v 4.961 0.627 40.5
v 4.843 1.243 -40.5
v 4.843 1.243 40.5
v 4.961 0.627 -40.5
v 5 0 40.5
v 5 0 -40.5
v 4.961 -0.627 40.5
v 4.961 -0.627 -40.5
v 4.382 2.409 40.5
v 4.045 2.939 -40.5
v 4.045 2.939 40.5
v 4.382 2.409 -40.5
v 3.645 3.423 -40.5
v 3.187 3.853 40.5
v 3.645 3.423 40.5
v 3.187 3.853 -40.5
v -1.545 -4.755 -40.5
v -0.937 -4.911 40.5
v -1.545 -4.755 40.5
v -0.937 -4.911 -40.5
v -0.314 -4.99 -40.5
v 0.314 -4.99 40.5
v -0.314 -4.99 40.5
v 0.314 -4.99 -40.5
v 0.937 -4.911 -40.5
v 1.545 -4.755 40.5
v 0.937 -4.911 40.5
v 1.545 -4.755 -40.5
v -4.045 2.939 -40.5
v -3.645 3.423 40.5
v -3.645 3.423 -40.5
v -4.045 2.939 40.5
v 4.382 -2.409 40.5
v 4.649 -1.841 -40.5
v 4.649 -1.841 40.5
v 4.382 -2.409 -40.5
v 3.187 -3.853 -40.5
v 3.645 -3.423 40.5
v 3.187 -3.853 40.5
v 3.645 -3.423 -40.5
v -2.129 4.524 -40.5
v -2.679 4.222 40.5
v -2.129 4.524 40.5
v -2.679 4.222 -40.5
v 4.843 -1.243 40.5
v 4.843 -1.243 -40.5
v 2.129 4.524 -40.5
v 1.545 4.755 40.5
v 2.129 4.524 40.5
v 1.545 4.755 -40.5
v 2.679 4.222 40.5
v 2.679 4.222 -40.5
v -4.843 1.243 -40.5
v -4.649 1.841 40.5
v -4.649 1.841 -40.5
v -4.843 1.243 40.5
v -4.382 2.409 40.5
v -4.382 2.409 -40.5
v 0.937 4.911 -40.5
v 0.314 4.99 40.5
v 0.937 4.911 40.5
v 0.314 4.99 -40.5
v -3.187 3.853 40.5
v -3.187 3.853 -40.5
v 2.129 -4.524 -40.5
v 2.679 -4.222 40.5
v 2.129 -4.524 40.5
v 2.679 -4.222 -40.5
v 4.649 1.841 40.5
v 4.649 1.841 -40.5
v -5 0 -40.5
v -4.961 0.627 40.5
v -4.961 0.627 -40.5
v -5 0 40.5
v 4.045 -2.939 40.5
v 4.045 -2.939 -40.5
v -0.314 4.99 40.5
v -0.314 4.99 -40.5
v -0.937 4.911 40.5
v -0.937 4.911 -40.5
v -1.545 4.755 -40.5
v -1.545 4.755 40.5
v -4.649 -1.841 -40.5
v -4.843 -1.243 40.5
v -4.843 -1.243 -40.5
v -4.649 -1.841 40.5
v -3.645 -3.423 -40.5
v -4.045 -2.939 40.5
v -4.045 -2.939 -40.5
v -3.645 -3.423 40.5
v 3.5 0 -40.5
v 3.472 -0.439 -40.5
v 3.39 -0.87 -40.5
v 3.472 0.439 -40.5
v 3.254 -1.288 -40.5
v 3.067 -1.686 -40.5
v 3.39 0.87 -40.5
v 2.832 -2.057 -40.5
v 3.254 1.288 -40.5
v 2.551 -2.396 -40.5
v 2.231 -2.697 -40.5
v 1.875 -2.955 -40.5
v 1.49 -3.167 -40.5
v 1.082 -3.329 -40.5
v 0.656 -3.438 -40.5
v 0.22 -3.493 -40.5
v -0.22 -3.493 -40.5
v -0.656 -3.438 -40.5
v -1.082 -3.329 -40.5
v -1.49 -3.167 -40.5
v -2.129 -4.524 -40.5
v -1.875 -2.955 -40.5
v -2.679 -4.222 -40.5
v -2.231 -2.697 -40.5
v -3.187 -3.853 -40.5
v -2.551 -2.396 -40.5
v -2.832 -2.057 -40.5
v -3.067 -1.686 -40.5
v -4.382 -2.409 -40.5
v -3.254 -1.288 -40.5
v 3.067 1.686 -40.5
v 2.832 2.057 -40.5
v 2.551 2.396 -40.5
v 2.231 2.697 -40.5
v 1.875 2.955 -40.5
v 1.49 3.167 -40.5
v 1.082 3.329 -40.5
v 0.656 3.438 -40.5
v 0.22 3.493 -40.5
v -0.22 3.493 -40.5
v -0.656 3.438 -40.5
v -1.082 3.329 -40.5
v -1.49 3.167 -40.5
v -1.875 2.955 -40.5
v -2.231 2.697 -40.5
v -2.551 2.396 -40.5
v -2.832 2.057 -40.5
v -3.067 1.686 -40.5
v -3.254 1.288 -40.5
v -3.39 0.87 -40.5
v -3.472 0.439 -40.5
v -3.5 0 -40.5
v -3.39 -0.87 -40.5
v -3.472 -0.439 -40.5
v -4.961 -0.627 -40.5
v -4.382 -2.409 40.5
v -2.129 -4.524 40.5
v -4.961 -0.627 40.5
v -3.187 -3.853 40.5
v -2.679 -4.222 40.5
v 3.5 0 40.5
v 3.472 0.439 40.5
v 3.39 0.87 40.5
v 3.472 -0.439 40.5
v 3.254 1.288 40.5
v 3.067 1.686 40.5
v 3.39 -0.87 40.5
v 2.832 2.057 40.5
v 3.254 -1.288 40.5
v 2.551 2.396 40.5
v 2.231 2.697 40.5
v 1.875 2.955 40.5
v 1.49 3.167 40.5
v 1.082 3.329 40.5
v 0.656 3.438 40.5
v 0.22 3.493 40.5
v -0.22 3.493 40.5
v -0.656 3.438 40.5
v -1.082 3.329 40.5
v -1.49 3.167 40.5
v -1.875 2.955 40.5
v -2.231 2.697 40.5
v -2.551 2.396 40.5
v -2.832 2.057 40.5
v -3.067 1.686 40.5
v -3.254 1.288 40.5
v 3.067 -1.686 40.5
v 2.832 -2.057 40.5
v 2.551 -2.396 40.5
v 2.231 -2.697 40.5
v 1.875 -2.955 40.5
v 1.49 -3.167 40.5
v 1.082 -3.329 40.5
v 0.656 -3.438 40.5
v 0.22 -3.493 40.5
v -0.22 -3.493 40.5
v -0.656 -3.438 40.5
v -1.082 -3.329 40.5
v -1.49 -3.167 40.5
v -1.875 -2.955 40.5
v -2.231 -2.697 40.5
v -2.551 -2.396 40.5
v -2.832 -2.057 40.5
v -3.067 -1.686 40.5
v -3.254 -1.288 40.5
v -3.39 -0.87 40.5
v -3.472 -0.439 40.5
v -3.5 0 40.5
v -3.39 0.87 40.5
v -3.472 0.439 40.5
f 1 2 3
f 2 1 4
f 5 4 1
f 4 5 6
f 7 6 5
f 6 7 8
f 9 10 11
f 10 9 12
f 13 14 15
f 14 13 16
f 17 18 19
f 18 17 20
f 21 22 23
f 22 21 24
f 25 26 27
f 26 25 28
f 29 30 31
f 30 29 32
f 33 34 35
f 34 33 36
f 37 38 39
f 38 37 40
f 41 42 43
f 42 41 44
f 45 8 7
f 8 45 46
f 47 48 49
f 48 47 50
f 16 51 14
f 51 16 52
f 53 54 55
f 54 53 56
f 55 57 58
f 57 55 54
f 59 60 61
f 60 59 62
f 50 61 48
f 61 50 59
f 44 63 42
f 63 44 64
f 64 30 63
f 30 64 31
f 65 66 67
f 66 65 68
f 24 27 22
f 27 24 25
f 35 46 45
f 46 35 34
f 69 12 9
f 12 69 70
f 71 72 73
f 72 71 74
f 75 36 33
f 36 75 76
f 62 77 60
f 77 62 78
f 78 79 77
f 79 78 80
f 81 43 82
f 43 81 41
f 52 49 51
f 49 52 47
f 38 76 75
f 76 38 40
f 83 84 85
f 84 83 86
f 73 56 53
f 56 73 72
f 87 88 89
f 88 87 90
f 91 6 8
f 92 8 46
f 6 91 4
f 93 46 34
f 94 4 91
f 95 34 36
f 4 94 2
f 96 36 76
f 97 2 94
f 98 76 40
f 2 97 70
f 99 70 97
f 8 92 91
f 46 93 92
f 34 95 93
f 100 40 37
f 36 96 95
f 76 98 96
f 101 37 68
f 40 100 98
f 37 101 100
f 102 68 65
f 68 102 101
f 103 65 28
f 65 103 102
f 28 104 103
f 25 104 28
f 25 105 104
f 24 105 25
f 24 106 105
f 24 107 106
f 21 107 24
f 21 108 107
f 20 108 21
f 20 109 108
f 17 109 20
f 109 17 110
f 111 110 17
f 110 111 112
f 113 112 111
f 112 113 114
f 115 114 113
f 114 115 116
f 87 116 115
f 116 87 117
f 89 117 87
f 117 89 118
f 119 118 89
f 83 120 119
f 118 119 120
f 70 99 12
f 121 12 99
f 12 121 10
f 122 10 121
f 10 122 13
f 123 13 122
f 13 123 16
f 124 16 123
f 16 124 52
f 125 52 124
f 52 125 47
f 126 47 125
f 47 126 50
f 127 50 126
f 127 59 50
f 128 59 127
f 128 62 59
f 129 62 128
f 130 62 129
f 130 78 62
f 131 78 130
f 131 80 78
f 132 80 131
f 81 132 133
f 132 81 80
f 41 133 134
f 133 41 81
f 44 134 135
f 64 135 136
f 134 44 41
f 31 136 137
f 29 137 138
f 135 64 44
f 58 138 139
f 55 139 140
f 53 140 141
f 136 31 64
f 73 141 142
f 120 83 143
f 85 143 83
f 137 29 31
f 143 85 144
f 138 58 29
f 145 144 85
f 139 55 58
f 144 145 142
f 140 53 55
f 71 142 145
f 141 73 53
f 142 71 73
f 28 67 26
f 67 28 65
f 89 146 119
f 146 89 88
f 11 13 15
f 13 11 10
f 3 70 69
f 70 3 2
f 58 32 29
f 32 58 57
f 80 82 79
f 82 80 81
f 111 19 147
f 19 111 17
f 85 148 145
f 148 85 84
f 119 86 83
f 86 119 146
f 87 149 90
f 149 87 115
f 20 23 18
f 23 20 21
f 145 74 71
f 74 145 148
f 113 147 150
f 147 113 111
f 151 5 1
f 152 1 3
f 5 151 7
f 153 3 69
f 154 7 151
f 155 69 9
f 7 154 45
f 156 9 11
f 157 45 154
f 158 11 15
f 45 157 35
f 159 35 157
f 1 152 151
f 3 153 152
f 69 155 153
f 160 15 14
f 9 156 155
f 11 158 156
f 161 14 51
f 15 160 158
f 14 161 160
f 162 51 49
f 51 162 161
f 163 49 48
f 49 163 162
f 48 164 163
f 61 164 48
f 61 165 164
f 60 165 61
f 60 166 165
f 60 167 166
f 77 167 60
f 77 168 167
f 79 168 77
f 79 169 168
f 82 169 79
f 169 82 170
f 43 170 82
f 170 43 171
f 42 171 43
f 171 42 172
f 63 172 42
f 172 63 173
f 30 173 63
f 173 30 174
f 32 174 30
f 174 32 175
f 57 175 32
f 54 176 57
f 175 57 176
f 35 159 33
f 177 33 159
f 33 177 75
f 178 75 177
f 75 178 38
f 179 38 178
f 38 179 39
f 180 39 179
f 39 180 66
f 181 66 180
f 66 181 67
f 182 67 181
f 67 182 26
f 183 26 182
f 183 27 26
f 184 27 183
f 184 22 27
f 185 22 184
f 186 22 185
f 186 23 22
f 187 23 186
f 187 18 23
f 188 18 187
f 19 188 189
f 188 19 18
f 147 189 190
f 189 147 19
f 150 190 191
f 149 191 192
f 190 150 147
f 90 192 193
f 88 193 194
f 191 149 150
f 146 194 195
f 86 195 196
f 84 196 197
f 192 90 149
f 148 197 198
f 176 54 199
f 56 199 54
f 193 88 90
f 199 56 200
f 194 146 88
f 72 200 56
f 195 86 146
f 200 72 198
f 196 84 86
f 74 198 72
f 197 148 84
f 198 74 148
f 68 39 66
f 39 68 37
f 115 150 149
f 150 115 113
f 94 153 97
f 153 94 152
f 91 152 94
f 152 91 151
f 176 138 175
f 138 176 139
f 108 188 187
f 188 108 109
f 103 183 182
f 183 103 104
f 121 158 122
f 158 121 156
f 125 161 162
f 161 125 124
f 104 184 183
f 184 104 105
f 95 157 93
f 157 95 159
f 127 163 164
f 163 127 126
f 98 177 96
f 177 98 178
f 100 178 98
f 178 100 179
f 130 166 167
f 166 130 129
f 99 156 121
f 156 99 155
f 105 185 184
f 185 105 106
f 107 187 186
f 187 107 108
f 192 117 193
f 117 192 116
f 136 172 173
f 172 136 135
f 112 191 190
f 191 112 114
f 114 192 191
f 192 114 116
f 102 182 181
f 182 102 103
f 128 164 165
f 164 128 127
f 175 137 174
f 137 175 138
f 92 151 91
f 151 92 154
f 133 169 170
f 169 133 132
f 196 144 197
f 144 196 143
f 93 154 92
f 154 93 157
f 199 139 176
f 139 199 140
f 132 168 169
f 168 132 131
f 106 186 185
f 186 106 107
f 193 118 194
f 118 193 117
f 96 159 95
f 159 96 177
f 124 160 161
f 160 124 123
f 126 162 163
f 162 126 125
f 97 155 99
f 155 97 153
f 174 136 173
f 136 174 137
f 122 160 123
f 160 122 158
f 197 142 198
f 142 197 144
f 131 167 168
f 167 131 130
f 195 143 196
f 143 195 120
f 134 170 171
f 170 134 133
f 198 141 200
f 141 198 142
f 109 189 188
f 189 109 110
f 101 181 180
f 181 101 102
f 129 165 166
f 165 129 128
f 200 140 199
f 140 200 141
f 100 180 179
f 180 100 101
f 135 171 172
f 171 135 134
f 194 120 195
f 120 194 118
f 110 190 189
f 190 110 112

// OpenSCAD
$fn = 50;


difference() {
	union() {
		translate(v = [0, 0, -40.5000000000]) {
			cylinder(h = 81, r = 5.0000000000);
		}
	}
	union() {
		translate(v = [0, 0, -100.0000000000]) {
			cylinder(h = 200, r = 3.5000000000);
		}
	}
}
